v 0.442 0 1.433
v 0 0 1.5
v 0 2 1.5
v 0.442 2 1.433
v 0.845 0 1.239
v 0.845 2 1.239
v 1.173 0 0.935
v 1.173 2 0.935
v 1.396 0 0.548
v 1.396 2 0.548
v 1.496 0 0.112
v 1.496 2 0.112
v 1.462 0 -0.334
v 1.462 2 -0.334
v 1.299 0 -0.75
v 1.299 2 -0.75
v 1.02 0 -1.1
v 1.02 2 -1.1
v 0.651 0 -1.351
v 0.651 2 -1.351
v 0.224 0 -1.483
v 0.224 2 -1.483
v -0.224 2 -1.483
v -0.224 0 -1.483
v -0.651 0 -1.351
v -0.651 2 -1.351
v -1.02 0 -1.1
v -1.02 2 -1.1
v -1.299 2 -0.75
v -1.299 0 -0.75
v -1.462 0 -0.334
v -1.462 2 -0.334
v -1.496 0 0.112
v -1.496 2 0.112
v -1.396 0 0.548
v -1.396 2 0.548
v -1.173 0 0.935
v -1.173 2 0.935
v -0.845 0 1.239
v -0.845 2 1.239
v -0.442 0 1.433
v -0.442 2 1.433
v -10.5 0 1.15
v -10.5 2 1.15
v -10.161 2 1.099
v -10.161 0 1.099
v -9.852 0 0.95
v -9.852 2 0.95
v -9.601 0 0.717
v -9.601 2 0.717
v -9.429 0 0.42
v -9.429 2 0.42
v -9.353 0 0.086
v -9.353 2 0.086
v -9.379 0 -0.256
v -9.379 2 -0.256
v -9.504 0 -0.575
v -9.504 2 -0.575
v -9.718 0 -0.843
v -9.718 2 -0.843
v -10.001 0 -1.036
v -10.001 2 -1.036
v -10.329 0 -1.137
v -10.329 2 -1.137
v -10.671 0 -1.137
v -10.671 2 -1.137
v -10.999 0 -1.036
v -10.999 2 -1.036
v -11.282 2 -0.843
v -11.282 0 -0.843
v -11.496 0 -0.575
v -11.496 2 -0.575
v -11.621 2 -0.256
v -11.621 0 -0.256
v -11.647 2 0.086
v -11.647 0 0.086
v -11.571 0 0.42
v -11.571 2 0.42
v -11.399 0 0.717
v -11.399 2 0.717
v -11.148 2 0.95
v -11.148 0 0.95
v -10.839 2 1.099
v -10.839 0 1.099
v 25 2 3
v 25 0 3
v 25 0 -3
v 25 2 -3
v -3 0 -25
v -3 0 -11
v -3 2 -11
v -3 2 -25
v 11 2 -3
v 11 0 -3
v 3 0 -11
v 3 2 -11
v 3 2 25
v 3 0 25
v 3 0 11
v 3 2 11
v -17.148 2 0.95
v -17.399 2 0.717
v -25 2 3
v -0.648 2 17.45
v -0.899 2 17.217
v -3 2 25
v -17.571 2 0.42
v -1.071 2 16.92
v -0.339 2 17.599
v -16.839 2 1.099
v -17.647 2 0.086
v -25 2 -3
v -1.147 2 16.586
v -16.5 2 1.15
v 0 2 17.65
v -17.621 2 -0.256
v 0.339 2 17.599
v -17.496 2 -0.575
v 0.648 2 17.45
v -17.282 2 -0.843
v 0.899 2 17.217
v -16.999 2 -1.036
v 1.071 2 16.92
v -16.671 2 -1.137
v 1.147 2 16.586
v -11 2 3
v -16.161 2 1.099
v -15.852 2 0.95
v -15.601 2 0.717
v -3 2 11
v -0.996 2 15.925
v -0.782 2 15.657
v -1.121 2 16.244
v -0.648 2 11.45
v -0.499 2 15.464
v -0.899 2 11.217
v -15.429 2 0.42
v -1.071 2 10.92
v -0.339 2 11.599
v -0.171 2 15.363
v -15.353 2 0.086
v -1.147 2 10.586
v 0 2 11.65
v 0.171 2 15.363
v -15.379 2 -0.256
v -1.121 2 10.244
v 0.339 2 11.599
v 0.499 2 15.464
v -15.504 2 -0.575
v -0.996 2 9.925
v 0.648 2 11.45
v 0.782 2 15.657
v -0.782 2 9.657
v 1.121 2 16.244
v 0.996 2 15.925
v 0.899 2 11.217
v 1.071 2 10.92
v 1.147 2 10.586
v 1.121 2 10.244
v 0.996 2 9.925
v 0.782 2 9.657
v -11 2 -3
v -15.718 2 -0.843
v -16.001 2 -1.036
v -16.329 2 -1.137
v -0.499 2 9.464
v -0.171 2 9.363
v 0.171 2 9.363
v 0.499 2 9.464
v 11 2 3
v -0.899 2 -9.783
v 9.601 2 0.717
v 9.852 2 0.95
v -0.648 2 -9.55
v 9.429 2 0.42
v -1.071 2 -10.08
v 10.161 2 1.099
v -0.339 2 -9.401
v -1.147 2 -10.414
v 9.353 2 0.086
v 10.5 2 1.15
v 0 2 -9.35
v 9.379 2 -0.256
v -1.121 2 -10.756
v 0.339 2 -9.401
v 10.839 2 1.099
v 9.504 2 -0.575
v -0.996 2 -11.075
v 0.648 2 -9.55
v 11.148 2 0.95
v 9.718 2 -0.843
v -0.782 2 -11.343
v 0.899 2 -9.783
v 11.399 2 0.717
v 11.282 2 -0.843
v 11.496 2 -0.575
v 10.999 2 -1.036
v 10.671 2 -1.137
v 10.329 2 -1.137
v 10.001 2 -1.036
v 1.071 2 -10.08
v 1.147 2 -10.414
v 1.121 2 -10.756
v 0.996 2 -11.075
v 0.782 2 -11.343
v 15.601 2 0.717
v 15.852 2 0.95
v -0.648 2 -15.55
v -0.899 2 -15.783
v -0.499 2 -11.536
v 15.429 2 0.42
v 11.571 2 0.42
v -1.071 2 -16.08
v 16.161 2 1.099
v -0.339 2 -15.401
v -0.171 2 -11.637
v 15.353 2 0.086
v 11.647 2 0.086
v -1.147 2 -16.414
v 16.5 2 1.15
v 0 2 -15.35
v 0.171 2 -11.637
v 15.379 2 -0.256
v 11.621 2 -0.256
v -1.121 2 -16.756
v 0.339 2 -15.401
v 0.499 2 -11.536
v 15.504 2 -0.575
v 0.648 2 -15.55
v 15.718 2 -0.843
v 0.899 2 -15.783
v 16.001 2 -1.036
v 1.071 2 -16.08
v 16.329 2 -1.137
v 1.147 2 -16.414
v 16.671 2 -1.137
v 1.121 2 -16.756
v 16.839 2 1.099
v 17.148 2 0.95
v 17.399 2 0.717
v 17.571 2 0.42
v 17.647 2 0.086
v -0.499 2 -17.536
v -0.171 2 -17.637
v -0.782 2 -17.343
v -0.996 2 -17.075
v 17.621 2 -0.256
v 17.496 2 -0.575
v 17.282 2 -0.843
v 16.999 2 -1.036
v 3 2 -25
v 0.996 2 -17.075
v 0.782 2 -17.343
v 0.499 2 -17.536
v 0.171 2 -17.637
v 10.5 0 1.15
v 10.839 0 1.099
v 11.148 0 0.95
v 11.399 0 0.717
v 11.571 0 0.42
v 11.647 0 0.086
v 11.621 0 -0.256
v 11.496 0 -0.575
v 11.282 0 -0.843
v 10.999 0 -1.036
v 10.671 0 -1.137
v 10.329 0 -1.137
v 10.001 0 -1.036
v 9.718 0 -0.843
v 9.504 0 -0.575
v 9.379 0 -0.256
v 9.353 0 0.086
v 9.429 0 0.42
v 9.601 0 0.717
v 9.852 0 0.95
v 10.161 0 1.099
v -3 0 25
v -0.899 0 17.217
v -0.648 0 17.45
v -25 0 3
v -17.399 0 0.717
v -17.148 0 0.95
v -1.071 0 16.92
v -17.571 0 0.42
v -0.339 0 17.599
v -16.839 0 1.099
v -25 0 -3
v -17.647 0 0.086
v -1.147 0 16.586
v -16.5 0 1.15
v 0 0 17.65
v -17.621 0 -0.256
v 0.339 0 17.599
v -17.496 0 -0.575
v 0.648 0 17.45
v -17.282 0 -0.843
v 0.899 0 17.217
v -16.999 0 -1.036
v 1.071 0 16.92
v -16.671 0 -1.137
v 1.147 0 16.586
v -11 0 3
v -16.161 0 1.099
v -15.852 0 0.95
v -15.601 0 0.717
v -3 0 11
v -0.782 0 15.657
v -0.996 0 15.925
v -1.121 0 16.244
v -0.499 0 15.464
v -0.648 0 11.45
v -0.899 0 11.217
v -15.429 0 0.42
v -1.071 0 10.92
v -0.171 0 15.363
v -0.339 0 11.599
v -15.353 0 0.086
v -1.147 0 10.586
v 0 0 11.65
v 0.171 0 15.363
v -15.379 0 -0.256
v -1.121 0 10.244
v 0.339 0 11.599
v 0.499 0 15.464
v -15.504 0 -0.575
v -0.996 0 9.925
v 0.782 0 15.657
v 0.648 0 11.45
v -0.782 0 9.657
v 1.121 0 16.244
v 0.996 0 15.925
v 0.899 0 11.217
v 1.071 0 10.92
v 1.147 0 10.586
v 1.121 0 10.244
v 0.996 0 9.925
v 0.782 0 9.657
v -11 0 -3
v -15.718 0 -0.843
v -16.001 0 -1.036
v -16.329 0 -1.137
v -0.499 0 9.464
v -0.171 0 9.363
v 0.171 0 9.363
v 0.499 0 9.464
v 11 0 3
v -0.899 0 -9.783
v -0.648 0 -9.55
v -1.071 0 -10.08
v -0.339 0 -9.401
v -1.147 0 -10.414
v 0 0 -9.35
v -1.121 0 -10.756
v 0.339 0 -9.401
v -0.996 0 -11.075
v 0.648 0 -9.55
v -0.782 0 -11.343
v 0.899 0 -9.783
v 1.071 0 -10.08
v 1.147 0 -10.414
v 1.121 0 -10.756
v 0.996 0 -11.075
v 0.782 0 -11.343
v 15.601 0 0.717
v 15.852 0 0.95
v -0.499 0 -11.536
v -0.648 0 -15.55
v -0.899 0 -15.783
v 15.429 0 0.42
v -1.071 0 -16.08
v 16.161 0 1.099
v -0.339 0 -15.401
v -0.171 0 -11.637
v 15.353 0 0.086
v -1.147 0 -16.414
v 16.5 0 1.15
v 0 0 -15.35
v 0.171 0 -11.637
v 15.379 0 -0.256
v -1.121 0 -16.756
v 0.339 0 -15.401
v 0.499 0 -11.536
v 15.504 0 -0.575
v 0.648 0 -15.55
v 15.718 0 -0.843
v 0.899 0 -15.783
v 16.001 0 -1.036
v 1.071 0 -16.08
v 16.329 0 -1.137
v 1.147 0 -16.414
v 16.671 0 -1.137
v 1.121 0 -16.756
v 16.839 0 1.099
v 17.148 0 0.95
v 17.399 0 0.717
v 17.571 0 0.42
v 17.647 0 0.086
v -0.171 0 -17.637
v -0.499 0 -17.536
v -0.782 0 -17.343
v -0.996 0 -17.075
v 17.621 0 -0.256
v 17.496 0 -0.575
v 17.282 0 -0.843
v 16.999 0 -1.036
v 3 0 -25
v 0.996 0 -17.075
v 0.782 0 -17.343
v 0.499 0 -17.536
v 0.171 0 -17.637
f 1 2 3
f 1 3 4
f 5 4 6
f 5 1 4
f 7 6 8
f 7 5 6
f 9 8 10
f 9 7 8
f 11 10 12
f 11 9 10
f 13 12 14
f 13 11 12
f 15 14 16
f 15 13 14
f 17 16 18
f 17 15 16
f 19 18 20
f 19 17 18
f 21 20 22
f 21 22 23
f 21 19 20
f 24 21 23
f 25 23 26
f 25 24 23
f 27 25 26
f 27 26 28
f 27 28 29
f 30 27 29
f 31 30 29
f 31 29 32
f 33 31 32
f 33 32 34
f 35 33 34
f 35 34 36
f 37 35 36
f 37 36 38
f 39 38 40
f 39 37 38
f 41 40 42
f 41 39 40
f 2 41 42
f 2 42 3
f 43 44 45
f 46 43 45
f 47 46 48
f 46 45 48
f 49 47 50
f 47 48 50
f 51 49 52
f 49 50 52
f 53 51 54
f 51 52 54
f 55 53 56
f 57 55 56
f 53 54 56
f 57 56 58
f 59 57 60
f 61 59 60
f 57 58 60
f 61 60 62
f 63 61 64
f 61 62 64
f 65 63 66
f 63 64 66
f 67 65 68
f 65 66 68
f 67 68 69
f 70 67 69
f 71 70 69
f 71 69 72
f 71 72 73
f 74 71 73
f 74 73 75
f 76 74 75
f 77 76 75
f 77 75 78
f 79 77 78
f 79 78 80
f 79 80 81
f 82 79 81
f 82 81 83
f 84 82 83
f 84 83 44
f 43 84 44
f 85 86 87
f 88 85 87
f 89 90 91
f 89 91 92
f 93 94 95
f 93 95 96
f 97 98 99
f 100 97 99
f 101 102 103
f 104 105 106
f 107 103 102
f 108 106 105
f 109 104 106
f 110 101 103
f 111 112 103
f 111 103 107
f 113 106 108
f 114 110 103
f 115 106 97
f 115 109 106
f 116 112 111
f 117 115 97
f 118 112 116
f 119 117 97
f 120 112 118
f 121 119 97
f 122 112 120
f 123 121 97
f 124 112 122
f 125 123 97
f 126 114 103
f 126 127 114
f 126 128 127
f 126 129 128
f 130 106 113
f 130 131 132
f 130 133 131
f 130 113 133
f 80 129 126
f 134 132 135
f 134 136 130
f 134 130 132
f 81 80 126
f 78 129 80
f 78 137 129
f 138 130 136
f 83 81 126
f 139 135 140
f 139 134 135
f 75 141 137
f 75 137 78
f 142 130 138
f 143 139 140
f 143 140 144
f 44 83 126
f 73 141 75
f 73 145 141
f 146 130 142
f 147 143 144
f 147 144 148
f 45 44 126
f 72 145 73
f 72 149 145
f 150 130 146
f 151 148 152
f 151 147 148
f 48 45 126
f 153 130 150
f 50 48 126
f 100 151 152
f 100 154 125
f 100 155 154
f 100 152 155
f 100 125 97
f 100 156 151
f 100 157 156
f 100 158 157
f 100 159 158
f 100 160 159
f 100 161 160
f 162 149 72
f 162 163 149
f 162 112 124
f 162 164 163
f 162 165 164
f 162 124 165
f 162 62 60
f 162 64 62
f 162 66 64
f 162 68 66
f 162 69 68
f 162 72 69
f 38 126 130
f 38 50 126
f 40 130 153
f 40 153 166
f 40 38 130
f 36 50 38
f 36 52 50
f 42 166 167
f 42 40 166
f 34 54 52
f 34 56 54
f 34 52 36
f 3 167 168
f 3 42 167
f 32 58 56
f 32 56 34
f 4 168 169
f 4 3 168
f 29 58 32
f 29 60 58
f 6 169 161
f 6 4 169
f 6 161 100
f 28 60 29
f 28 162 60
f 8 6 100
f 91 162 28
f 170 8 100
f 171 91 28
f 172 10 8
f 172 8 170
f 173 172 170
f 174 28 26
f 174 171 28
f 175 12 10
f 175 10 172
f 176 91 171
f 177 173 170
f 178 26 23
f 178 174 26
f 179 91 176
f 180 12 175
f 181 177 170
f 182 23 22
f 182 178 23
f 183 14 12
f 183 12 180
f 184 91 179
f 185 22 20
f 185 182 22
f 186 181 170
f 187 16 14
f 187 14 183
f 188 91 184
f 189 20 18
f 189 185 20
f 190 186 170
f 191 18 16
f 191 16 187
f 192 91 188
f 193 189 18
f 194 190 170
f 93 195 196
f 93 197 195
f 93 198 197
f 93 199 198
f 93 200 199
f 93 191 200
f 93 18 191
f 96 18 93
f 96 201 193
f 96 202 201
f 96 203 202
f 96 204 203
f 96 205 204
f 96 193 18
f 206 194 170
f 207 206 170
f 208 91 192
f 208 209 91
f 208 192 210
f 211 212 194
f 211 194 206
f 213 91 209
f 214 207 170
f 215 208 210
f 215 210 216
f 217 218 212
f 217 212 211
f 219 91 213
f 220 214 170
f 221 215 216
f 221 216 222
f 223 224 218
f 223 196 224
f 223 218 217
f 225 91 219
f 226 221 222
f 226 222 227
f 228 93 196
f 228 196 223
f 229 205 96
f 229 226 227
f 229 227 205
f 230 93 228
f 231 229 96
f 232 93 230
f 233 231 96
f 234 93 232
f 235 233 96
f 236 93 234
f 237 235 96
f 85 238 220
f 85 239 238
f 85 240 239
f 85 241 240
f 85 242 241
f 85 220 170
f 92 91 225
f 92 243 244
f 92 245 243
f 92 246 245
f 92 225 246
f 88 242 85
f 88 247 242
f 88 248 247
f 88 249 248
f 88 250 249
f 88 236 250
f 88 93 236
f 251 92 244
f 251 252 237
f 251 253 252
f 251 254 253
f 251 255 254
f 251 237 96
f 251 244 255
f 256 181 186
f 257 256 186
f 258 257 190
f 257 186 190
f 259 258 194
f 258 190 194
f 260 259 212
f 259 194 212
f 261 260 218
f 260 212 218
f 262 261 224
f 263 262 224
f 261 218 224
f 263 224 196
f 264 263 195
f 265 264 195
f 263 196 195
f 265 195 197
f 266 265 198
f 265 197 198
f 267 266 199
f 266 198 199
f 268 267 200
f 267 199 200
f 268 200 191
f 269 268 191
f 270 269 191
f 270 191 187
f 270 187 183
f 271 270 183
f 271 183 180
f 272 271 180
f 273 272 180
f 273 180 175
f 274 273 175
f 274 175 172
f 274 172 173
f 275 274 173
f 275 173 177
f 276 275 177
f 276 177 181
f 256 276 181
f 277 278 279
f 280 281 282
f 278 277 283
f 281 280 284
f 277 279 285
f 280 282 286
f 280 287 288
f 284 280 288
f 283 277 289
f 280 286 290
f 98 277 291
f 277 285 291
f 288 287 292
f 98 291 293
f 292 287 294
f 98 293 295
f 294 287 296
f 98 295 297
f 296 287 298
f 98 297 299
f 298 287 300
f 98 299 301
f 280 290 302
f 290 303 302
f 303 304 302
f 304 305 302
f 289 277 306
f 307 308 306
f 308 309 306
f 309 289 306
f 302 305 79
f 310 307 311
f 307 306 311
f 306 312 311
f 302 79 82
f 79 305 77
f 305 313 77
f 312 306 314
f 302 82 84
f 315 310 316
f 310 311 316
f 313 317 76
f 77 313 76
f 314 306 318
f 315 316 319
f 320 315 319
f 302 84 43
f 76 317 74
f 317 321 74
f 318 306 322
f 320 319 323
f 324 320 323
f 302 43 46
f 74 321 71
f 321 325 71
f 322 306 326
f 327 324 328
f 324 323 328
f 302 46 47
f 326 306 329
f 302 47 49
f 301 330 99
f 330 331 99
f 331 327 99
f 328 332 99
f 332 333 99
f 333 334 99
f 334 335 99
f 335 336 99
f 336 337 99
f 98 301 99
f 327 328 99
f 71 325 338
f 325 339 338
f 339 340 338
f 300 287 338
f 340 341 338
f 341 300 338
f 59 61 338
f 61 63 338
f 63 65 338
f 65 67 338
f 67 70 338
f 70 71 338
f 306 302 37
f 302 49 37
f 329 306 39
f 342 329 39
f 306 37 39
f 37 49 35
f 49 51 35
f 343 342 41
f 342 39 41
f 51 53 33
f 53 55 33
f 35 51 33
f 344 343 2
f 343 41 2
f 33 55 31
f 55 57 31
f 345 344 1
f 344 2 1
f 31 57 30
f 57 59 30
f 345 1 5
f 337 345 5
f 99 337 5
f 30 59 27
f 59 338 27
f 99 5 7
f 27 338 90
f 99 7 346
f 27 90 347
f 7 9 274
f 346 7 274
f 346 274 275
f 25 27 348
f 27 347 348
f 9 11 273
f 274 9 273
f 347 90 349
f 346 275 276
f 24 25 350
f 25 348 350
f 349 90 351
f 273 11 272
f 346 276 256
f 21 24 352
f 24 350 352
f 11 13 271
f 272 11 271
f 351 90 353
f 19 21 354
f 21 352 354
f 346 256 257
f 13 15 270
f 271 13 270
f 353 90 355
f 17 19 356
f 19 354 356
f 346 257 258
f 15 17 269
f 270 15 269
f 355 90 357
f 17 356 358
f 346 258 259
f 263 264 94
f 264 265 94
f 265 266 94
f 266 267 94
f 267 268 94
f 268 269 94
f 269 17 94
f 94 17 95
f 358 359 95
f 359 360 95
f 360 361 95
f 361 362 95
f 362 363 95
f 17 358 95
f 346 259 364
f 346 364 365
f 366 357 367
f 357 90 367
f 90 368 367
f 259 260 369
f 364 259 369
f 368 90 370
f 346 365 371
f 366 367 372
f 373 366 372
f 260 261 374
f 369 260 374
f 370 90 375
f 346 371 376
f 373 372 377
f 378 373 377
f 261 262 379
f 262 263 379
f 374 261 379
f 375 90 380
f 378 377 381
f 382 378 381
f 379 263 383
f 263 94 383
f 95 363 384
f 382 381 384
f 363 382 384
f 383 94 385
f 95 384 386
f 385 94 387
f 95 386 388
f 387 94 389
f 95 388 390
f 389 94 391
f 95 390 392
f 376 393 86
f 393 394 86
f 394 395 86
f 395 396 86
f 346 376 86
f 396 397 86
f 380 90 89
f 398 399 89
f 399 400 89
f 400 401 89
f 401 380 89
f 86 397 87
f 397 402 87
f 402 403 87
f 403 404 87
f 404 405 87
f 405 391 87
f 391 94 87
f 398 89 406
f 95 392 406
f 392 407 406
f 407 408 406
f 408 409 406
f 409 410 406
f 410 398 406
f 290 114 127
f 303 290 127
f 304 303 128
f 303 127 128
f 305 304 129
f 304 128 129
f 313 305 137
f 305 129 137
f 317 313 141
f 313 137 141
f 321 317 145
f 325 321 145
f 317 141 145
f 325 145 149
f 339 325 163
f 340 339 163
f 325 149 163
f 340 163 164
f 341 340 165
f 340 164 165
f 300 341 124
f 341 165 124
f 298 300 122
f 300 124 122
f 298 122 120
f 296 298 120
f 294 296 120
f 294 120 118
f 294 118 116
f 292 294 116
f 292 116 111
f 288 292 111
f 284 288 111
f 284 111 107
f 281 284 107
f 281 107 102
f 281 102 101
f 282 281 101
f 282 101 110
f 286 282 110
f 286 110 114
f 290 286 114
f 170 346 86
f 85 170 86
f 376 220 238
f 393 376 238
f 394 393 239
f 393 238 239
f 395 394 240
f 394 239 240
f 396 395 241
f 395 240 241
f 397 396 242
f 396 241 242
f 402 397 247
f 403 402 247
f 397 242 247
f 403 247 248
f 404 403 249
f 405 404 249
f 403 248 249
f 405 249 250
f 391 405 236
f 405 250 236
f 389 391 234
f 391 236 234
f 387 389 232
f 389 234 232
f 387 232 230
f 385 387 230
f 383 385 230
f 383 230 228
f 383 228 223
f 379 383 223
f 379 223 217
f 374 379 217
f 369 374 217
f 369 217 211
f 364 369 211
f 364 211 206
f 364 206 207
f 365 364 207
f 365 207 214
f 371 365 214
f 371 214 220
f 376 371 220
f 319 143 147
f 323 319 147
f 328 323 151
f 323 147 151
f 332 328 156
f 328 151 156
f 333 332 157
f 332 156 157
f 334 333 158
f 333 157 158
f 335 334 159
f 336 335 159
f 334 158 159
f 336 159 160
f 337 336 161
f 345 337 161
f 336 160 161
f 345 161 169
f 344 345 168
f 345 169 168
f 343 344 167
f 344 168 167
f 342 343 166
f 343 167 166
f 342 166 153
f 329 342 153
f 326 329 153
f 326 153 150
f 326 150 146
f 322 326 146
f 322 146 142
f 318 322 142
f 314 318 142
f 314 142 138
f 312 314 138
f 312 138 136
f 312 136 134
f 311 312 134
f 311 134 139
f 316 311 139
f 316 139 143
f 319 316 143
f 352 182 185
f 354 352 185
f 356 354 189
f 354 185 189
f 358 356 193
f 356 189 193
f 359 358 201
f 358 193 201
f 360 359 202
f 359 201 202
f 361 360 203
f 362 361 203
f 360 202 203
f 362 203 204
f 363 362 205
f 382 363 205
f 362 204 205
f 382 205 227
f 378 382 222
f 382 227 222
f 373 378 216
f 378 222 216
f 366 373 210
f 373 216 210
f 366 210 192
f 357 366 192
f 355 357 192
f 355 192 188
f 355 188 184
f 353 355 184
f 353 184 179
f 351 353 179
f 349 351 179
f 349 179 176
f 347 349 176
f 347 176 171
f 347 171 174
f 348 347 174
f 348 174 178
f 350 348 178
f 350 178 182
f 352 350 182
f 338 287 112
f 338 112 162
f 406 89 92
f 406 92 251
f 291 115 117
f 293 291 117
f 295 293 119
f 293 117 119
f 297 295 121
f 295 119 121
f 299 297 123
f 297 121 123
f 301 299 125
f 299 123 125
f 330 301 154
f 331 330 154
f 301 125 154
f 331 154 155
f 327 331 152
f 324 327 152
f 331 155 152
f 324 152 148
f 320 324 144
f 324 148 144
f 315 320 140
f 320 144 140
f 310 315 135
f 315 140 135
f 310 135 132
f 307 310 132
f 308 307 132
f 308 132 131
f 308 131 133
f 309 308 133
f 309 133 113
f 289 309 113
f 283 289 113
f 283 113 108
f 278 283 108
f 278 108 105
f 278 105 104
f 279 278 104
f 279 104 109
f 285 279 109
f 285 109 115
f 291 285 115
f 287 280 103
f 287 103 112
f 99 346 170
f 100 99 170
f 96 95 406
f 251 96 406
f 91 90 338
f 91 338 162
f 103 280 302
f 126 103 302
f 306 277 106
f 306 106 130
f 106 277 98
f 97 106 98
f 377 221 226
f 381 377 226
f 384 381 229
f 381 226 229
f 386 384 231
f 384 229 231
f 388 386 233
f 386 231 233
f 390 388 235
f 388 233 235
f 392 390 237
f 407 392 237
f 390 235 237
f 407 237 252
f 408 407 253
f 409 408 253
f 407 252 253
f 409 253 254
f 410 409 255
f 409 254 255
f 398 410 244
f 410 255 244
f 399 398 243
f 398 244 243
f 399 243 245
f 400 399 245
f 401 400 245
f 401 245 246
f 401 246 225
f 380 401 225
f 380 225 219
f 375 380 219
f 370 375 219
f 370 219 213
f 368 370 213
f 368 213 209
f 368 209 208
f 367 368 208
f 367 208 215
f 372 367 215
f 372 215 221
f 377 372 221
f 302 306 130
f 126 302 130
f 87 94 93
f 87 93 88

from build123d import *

# Parameters (mm, degrees)
SKETCH_1_W          = 22
SKETCH_1_H          = 6
SKETCH_1_W_2        = 6
SKETCH_1_H_2        = 22
SKETCH_1_R          = 1.5
EXTRUDE_1_DEPTH     = 2
SKETCH_2_R          = 1.15
CUT_EXTRUDE_1_DEPTH = 12
CHAMFER_1_SIZE      = 8


with BuildPart() as part:
    # 草图1 → 凸台-拉伸1 (new body)
    # profile 1 of 5: a face of its own
    with BuildSketch(Plane(origin=(0, 0, 0), x_dir=(1, 0, 0), z_dir=(0, 1, 0))):
        with Locations((-14, 0)):
            Rectangle(SKETCH_1_W, SKETCH_1_H)
    # profile 2 of 5: a face of its own
    with BuildSketch(Plane(origin=(0, 0, 0), x_dir=(1, 0, 0), z_dir=(0, 1, 0))):
        with Locations((14, 0)):
            Rectangle(SKETCH_1_W, SKETCH_1_H)
    # profile 3 of 5: a face of its own
    with BuildSketch(Plane(origin=(0, 0, 0), x_dir=(1, 0, 0), z_dir=(0, 1, 0))):
        with Locations((0, 14)):
            Rectangle(SKETCH_1_W_2, SKETCH_1_H_2)
    # profile 4 of 5: a face of its own
    with BuildSketch(Plane(origin=(0, 0, 0), x_dir=(1, 0, 0), z_dir=(0, 1, 0))):
        with Locations((0, -14)):
            Rectangle(SKETCH_1_W_2, SKETCH_1_H_2)
    # profile 5 of 5: a face of its own
    with BuildSketch(Plane(origin=(0, 0, 0), x_dir=(1, 0, 0), z_dir=(0, 1, 0))):
        Rectangle(SKETCH_1_W_2, SKETCH_1_H)
        with Locations(Location((0, 0, 0), (0, 0, 270))):
            Circle(SKETCH_1_R, mode=Mode.SUBTRACT)
    extrude(amount=EXTRUDE_1_DEPTH)

    # 草图2 → 切除-拉伸1 (cut)
    with BuildSketch(Plane(origin=(0, 2, 0), x_dir=(1, 0, 0), z_dir=(0, 1, 0))):
        with Locations(Location((0, 10.5, 0), (0, 0, 270))):
            Circle(SKETCH_2_R)
        with Locations(Location((0, 16.5, 0), (0, 0, 270))):
            Circle(SKETCH_2_R)
        with Locations(Location((16.5, 0, 0), (0, 0, 270))):
            Circle(SKETCH_2_R)
        with Locations(Location((10.5, 0, 0), (0, 0, 270))):
            Circle(SKETCH_2_R)
        with Locations(Location((0, -16.5, 0), (0, 0, 270))):
            Circle(SKETCH_2_R)
        with Locations(Location((0, -10.5, 0), (0, 0, 270))):
            Circle(SKETCH_2_R)
        with Locations(Location((-16.5, 0, 0), (0, 0, 270))):
            Circle(SKETCH_2_R)
        with Locations(Location((-10.5, 0, 0), (0, 0, 270))):
            Circle(SKETCH_2_R)
    extrude(amount=-CUT_EXTRUDE_1_DEPTH, mode=Mode.SUBTRACT)

    # 倒角1
    chamfer_1_edges = [part.edges().sort_by_distance(p)[0] for p in [
        (-3, 1, -3),
        (3, 1, -3),
        (3, 1, 3),
        (-3, 1, 3),
    ]]
    chamfer(chamfer_1_edges, length=CHAMFER_1_SIZE)


solid = part.part
